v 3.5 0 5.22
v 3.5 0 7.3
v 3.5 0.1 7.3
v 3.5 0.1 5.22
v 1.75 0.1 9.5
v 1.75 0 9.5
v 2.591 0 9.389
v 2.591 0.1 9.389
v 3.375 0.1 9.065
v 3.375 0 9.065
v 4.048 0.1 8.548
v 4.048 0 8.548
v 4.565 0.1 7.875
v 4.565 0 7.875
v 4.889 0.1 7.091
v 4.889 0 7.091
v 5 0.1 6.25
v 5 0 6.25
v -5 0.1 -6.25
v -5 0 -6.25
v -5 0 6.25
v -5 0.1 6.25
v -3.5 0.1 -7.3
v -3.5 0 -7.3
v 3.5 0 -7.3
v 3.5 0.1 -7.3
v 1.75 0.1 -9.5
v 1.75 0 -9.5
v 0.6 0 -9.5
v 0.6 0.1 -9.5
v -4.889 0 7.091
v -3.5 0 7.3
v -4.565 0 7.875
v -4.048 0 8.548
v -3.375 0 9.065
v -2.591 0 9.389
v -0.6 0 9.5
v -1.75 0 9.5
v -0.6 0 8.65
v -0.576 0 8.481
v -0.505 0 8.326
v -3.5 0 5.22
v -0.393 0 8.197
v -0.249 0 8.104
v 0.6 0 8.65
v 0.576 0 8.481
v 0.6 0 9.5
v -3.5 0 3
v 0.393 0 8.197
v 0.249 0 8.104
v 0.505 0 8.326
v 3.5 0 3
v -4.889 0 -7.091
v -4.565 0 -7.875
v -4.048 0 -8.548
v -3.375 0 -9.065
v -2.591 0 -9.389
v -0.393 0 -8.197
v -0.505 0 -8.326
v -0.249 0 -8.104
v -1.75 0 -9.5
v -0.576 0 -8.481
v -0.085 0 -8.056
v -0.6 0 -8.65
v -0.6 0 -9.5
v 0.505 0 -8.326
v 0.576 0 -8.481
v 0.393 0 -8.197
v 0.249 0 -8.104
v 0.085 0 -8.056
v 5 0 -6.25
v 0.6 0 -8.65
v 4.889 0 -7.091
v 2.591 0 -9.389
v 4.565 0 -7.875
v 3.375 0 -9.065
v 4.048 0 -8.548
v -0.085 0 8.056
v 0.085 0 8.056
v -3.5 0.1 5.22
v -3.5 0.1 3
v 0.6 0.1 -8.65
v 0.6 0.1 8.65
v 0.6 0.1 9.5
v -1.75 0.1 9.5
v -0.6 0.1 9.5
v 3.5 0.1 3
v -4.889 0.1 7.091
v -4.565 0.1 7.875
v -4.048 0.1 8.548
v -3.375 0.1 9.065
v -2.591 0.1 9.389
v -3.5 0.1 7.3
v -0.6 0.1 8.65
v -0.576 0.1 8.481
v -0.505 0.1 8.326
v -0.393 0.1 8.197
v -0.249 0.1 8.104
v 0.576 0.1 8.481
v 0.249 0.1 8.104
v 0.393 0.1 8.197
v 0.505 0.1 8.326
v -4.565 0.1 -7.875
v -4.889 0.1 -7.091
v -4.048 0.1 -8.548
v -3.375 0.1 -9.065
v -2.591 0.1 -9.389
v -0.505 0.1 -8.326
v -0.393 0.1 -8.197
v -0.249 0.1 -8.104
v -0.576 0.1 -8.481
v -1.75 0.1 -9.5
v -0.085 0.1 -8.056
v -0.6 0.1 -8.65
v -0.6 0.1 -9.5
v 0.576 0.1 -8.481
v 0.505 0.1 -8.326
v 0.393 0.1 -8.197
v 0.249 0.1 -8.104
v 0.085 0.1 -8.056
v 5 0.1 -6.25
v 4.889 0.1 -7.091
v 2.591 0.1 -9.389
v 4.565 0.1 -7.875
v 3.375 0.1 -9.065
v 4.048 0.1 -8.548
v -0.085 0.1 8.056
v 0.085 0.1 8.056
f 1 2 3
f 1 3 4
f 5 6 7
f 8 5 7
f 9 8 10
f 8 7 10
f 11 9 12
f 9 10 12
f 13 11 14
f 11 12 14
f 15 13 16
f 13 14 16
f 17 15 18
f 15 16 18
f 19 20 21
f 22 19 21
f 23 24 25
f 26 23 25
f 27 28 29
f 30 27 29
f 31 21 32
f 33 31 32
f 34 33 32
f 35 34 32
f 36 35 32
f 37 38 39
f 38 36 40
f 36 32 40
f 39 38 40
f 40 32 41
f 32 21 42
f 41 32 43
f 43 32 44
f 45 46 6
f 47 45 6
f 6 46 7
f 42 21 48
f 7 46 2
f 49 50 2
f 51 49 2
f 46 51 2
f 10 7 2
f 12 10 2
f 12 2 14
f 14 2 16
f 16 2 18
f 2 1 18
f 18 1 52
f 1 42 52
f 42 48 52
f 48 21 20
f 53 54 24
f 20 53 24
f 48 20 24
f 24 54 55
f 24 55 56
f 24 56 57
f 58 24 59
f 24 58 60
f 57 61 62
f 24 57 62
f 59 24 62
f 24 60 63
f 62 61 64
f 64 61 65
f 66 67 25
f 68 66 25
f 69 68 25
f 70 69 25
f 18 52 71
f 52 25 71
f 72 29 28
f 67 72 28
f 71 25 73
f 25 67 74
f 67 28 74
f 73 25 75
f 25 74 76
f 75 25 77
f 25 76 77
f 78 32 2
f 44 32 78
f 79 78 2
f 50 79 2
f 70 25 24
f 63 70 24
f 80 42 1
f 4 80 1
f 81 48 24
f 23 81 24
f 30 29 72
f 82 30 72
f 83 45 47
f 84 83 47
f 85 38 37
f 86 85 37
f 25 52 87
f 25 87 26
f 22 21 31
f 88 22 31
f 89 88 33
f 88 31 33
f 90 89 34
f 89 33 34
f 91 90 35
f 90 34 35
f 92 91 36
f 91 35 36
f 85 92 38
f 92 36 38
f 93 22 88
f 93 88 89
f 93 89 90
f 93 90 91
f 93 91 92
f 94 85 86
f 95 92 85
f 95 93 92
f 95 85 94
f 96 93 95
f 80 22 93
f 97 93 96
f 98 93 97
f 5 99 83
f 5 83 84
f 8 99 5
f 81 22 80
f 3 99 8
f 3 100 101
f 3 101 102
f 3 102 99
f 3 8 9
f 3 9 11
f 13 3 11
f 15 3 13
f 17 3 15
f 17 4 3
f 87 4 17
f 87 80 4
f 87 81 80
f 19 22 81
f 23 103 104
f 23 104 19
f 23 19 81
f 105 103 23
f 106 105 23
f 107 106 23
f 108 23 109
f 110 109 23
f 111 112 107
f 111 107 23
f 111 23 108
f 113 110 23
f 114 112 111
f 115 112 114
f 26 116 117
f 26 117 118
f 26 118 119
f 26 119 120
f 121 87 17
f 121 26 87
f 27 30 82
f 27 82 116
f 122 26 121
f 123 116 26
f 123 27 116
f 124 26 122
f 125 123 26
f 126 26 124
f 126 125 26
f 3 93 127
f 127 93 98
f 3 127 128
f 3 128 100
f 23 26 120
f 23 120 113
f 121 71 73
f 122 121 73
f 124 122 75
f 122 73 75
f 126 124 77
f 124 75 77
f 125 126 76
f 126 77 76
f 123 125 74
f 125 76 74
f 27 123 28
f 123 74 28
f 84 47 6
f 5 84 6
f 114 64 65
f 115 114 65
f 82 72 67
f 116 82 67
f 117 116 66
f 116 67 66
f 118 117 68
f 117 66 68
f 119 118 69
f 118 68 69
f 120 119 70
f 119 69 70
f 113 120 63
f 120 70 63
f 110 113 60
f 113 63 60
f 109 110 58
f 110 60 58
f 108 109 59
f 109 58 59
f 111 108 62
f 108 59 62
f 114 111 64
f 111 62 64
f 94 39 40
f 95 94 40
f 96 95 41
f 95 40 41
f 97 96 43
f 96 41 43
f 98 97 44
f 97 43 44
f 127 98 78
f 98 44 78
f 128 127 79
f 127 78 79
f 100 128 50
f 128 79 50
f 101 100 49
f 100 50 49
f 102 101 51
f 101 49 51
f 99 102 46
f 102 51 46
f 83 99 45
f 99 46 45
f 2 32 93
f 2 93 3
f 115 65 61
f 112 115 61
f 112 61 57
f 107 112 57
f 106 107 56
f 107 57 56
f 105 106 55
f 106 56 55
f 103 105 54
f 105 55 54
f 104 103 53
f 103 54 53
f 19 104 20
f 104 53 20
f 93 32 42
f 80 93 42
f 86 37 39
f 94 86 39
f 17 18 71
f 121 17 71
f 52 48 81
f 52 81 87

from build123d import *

# Parameters (mm, degrees)
SKETCH2_W           = 7
SKETCH2_H           = 10.3
SKETCH2_H_2         = 2.08
BOSS_EXTRUDE1_DEPTH = 0.1


with BuildPart() as part:
    # Sketch2 → Boss-Extrude1 (new body)
    with BuildSketch(Plane(origin=(0, 0, 0), x_dir=(1, 0, 0), z_dir=(0, 1, 0))):
        with BuildLine():
            Line((-0.6, 9.5), (-1.75, 9.5))
            ThreePointArc((-1.75, 9.5), (-4.048097039, 8.548097039), (-5, 6.25))
            Line((-5, 6.25), (-5, -6.25))
            ThreePointArc((-5, -6.25), (-4.048097039, -8.548097039), (-1.75, -9.5))
            Line((-1.75, -9.5), (-0.6, -9.5))
            Line((-0.6, -9.5), (-0.6, -8.65))
            ThreePointArc((-0.6, -8.65), (0, -8.05), (0.6, -8.65))
            Line((0.6, -8.65), (0.6, -9.5))
            Line((0.6, -9.5), (1.75, -9.5))
            ThreePointArc((1.75, -9.5), (4.048097039, -8.548097039), (5, -6.25))
            Line((5, -6.25), (5, 6.25))
            ThreePointArc((5, 6.25), (4.048097039, 8.548097039), (1.75, 9.5))
            Line((1.75, 9.5), (0.6, 9.5))
            Line((0.6, 9.5), (0.6, 8.65))
            ThreePointArc((0.6, 8.65), (0, 8.05), (-0.6, 8.65))
            Line((-0.6, 8.65), (-0.6, 9.5))
        make_face()
        with Locations((0, 2.15)):
            Rectangle(SKETCH2_W, SKETCH2_H, mode=Mode.SUBTRACT)
        with Locations((0, -6.26)):
            Rectangle(SKETCH2_W, SKETCH2_H_2, mode=Mode.SUBTRACT)
    extrude(amount=BOSS_EXTRUDE1_DEPTH)


solid = part.part
